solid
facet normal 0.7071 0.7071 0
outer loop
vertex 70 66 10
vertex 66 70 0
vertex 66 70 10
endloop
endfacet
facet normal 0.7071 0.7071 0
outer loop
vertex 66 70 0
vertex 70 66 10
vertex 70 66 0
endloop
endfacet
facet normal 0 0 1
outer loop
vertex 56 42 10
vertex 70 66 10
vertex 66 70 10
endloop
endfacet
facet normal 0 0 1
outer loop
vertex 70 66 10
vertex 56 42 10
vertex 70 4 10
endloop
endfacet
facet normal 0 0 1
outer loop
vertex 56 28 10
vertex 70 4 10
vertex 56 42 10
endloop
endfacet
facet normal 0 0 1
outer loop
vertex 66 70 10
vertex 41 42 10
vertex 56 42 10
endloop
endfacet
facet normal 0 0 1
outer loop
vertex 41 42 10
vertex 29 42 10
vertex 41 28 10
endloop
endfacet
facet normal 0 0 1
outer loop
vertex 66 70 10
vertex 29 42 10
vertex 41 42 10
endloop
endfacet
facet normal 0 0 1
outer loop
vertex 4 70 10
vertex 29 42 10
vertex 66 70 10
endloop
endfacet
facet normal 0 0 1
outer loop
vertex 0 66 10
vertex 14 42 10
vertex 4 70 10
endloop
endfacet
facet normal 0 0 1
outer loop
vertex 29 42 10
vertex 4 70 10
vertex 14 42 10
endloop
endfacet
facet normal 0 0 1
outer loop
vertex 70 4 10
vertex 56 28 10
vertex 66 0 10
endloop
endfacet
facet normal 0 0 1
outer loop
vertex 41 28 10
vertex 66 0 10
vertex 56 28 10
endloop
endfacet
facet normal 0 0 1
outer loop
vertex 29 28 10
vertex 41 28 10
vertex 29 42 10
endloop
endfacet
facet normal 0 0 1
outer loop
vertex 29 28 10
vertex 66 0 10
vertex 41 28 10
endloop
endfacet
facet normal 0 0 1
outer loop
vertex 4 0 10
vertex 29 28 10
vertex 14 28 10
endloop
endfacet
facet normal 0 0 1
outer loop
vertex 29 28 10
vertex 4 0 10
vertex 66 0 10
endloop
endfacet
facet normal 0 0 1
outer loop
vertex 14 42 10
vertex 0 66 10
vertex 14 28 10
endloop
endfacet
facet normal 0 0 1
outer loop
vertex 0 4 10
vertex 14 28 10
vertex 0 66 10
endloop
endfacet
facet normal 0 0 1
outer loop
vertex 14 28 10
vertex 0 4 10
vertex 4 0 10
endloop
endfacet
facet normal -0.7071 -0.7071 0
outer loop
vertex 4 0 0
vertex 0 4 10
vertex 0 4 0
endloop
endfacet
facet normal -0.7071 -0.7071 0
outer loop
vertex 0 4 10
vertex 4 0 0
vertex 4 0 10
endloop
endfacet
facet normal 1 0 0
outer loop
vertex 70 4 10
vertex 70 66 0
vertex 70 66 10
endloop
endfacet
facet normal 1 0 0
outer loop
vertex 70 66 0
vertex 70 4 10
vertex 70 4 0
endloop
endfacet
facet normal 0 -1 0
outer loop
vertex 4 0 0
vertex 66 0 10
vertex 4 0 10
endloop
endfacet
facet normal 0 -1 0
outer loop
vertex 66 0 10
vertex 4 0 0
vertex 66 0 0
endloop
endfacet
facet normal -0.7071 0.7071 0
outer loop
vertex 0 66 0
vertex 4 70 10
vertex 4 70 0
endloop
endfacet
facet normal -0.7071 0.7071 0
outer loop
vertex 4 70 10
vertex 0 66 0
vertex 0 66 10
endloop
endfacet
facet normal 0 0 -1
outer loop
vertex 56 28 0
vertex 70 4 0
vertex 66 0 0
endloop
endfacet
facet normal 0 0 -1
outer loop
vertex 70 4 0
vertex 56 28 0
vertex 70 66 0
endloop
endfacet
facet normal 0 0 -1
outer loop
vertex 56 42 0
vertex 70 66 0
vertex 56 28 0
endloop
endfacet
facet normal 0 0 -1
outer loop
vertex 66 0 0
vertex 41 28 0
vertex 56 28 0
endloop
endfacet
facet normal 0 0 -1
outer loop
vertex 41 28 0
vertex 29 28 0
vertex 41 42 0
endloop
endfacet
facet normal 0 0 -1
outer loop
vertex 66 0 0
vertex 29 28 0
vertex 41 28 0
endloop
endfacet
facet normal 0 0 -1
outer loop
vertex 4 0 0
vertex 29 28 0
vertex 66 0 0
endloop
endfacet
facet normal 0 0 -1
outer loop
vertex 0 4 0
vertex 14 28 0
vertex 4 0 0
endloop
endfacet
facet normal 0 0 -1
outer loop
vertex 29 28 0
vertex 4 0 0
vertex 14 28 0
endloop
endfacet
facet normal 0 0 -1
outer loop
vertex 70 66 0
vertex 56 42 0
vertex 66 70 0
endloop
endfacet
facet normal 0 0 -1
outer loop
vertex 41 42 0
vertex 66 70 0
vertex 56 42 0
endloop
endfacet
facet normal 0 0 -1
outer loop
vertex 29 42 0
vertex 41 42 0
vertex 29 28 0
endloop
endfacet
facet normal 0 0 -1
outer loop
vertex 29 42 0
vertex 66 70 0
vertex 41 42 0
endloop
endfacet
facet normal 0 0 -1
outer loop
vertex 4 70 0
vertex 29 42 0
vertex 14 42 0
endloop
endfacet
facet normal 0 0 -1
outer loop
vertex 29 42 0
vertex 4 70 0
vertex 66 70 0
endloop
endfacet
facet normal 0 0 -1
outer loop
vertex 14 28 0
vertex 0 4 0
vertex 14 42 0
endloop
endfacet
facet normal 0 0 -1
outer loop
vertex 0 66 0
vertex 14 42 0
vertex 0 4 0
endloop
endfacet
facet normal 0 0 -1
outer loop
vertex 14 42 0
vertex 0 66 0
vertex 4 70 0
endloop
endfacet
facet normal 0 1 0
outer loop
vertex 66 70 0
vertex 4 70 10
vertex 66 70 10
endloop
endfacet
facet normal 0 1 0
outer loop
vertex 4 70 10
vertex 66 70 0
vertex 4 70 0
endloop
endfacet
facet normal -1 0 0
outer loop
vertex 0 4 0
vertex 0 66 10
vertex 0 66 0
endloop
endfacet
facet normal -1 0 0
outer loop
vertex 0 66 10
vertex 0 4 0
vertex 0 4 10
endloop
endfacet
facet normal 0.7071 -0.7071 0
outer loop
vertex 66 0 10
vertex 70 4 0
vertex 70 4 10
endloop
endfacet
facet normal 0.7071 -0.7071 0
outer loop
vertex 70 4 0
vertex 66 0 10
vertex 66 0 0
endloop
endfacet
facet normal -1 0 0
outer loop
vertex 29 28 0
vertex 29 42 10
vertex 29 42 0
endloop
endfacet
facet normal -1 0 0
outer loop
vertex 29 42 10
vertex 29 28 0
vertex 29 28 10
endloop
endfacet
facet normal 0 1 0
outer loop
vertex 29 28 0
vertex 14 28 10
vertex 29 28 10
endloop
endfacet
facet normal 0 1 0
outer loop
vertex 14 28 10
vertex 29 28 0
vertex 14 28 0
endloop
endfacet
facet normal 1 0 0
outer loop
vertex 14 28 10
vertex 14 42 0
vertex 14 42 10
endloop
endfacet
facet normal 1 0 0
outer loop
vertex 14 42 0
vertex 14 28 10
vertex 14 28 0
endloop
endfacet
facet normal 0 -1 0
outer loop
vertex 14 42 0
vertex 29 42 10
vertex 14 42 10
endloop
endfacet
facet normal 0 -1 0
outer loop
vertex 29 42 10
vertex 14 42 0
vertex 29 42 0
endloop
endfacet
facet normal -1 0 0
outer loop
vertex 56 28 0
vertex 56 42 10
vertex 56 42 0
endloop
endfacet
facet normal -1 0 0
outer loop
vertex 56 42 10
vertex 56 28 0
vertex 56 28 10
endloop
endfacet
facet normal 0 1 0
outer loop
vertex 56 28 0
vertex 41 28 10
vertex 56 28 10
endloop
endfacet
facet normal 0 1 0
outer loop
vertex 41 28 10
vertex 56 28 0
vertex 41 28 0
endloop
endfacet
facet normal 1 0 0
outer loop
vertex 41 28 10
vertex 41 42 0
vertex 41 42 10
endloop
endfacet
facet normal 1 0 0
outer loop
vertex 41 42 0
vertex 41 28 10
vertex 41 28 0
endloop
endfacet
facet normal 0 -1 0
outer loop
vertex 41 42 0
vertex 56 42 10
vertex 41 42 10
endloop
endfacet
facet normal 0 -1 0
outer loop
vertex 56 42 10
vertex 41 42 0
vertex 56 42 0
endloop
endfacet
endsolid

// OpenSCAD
$fn = 32;

// ----------------------------------------------------------------------
// Windowed plate: 2 voids, 70 x 70 x 10 mm
// ----------------------------------------------------------------------

// --- parameters (mm) ---
plate_l = 70;             // plate length, X
plate_w = 70;             // plate width, Y
plate_t = 10;             // plate thickness, Z
edge_margin = 8;          // wall from the plate edge to any window
windows = 2;              // number of windows in the row
win_l = 15;               // window length
win_w = 14;               // window width
win_pitch = 27;           // window pitch along X
depth_1 = 10;             // depth of void 1 (full thickness = through)
depth_2 = 10;             // depth of void 2 (full thickness = through)
corner_c = 4;             // corner chamfer of the plate

profile = [[4, 0], [66, 0], [70, 4], [70, 66], [66, 70], [4, 70], [0, 66], [0, 4]];  // primary outline, 8 points, counter clockwise
void_1 = [[14, 28], [29, 28], [29, 42], [14, 42]];  // window 1 of the row, 4 points
void_2 = [[41, 28], [56, 28], [56, 42], [41, 42]];  // window 2 of the row, 4 points

// --- the one profile operation ---
difference() {
  linear_extrude(height = plate_t) polygon(points = profile);
  translate([0, 0, -1])
    linear_extrude(height = plate_t + 2) polygon(points = void_1);
  translate([0, 0, -1])
    linear_extrude(height = plate_t + 2) polygon(points = void_2);
}
